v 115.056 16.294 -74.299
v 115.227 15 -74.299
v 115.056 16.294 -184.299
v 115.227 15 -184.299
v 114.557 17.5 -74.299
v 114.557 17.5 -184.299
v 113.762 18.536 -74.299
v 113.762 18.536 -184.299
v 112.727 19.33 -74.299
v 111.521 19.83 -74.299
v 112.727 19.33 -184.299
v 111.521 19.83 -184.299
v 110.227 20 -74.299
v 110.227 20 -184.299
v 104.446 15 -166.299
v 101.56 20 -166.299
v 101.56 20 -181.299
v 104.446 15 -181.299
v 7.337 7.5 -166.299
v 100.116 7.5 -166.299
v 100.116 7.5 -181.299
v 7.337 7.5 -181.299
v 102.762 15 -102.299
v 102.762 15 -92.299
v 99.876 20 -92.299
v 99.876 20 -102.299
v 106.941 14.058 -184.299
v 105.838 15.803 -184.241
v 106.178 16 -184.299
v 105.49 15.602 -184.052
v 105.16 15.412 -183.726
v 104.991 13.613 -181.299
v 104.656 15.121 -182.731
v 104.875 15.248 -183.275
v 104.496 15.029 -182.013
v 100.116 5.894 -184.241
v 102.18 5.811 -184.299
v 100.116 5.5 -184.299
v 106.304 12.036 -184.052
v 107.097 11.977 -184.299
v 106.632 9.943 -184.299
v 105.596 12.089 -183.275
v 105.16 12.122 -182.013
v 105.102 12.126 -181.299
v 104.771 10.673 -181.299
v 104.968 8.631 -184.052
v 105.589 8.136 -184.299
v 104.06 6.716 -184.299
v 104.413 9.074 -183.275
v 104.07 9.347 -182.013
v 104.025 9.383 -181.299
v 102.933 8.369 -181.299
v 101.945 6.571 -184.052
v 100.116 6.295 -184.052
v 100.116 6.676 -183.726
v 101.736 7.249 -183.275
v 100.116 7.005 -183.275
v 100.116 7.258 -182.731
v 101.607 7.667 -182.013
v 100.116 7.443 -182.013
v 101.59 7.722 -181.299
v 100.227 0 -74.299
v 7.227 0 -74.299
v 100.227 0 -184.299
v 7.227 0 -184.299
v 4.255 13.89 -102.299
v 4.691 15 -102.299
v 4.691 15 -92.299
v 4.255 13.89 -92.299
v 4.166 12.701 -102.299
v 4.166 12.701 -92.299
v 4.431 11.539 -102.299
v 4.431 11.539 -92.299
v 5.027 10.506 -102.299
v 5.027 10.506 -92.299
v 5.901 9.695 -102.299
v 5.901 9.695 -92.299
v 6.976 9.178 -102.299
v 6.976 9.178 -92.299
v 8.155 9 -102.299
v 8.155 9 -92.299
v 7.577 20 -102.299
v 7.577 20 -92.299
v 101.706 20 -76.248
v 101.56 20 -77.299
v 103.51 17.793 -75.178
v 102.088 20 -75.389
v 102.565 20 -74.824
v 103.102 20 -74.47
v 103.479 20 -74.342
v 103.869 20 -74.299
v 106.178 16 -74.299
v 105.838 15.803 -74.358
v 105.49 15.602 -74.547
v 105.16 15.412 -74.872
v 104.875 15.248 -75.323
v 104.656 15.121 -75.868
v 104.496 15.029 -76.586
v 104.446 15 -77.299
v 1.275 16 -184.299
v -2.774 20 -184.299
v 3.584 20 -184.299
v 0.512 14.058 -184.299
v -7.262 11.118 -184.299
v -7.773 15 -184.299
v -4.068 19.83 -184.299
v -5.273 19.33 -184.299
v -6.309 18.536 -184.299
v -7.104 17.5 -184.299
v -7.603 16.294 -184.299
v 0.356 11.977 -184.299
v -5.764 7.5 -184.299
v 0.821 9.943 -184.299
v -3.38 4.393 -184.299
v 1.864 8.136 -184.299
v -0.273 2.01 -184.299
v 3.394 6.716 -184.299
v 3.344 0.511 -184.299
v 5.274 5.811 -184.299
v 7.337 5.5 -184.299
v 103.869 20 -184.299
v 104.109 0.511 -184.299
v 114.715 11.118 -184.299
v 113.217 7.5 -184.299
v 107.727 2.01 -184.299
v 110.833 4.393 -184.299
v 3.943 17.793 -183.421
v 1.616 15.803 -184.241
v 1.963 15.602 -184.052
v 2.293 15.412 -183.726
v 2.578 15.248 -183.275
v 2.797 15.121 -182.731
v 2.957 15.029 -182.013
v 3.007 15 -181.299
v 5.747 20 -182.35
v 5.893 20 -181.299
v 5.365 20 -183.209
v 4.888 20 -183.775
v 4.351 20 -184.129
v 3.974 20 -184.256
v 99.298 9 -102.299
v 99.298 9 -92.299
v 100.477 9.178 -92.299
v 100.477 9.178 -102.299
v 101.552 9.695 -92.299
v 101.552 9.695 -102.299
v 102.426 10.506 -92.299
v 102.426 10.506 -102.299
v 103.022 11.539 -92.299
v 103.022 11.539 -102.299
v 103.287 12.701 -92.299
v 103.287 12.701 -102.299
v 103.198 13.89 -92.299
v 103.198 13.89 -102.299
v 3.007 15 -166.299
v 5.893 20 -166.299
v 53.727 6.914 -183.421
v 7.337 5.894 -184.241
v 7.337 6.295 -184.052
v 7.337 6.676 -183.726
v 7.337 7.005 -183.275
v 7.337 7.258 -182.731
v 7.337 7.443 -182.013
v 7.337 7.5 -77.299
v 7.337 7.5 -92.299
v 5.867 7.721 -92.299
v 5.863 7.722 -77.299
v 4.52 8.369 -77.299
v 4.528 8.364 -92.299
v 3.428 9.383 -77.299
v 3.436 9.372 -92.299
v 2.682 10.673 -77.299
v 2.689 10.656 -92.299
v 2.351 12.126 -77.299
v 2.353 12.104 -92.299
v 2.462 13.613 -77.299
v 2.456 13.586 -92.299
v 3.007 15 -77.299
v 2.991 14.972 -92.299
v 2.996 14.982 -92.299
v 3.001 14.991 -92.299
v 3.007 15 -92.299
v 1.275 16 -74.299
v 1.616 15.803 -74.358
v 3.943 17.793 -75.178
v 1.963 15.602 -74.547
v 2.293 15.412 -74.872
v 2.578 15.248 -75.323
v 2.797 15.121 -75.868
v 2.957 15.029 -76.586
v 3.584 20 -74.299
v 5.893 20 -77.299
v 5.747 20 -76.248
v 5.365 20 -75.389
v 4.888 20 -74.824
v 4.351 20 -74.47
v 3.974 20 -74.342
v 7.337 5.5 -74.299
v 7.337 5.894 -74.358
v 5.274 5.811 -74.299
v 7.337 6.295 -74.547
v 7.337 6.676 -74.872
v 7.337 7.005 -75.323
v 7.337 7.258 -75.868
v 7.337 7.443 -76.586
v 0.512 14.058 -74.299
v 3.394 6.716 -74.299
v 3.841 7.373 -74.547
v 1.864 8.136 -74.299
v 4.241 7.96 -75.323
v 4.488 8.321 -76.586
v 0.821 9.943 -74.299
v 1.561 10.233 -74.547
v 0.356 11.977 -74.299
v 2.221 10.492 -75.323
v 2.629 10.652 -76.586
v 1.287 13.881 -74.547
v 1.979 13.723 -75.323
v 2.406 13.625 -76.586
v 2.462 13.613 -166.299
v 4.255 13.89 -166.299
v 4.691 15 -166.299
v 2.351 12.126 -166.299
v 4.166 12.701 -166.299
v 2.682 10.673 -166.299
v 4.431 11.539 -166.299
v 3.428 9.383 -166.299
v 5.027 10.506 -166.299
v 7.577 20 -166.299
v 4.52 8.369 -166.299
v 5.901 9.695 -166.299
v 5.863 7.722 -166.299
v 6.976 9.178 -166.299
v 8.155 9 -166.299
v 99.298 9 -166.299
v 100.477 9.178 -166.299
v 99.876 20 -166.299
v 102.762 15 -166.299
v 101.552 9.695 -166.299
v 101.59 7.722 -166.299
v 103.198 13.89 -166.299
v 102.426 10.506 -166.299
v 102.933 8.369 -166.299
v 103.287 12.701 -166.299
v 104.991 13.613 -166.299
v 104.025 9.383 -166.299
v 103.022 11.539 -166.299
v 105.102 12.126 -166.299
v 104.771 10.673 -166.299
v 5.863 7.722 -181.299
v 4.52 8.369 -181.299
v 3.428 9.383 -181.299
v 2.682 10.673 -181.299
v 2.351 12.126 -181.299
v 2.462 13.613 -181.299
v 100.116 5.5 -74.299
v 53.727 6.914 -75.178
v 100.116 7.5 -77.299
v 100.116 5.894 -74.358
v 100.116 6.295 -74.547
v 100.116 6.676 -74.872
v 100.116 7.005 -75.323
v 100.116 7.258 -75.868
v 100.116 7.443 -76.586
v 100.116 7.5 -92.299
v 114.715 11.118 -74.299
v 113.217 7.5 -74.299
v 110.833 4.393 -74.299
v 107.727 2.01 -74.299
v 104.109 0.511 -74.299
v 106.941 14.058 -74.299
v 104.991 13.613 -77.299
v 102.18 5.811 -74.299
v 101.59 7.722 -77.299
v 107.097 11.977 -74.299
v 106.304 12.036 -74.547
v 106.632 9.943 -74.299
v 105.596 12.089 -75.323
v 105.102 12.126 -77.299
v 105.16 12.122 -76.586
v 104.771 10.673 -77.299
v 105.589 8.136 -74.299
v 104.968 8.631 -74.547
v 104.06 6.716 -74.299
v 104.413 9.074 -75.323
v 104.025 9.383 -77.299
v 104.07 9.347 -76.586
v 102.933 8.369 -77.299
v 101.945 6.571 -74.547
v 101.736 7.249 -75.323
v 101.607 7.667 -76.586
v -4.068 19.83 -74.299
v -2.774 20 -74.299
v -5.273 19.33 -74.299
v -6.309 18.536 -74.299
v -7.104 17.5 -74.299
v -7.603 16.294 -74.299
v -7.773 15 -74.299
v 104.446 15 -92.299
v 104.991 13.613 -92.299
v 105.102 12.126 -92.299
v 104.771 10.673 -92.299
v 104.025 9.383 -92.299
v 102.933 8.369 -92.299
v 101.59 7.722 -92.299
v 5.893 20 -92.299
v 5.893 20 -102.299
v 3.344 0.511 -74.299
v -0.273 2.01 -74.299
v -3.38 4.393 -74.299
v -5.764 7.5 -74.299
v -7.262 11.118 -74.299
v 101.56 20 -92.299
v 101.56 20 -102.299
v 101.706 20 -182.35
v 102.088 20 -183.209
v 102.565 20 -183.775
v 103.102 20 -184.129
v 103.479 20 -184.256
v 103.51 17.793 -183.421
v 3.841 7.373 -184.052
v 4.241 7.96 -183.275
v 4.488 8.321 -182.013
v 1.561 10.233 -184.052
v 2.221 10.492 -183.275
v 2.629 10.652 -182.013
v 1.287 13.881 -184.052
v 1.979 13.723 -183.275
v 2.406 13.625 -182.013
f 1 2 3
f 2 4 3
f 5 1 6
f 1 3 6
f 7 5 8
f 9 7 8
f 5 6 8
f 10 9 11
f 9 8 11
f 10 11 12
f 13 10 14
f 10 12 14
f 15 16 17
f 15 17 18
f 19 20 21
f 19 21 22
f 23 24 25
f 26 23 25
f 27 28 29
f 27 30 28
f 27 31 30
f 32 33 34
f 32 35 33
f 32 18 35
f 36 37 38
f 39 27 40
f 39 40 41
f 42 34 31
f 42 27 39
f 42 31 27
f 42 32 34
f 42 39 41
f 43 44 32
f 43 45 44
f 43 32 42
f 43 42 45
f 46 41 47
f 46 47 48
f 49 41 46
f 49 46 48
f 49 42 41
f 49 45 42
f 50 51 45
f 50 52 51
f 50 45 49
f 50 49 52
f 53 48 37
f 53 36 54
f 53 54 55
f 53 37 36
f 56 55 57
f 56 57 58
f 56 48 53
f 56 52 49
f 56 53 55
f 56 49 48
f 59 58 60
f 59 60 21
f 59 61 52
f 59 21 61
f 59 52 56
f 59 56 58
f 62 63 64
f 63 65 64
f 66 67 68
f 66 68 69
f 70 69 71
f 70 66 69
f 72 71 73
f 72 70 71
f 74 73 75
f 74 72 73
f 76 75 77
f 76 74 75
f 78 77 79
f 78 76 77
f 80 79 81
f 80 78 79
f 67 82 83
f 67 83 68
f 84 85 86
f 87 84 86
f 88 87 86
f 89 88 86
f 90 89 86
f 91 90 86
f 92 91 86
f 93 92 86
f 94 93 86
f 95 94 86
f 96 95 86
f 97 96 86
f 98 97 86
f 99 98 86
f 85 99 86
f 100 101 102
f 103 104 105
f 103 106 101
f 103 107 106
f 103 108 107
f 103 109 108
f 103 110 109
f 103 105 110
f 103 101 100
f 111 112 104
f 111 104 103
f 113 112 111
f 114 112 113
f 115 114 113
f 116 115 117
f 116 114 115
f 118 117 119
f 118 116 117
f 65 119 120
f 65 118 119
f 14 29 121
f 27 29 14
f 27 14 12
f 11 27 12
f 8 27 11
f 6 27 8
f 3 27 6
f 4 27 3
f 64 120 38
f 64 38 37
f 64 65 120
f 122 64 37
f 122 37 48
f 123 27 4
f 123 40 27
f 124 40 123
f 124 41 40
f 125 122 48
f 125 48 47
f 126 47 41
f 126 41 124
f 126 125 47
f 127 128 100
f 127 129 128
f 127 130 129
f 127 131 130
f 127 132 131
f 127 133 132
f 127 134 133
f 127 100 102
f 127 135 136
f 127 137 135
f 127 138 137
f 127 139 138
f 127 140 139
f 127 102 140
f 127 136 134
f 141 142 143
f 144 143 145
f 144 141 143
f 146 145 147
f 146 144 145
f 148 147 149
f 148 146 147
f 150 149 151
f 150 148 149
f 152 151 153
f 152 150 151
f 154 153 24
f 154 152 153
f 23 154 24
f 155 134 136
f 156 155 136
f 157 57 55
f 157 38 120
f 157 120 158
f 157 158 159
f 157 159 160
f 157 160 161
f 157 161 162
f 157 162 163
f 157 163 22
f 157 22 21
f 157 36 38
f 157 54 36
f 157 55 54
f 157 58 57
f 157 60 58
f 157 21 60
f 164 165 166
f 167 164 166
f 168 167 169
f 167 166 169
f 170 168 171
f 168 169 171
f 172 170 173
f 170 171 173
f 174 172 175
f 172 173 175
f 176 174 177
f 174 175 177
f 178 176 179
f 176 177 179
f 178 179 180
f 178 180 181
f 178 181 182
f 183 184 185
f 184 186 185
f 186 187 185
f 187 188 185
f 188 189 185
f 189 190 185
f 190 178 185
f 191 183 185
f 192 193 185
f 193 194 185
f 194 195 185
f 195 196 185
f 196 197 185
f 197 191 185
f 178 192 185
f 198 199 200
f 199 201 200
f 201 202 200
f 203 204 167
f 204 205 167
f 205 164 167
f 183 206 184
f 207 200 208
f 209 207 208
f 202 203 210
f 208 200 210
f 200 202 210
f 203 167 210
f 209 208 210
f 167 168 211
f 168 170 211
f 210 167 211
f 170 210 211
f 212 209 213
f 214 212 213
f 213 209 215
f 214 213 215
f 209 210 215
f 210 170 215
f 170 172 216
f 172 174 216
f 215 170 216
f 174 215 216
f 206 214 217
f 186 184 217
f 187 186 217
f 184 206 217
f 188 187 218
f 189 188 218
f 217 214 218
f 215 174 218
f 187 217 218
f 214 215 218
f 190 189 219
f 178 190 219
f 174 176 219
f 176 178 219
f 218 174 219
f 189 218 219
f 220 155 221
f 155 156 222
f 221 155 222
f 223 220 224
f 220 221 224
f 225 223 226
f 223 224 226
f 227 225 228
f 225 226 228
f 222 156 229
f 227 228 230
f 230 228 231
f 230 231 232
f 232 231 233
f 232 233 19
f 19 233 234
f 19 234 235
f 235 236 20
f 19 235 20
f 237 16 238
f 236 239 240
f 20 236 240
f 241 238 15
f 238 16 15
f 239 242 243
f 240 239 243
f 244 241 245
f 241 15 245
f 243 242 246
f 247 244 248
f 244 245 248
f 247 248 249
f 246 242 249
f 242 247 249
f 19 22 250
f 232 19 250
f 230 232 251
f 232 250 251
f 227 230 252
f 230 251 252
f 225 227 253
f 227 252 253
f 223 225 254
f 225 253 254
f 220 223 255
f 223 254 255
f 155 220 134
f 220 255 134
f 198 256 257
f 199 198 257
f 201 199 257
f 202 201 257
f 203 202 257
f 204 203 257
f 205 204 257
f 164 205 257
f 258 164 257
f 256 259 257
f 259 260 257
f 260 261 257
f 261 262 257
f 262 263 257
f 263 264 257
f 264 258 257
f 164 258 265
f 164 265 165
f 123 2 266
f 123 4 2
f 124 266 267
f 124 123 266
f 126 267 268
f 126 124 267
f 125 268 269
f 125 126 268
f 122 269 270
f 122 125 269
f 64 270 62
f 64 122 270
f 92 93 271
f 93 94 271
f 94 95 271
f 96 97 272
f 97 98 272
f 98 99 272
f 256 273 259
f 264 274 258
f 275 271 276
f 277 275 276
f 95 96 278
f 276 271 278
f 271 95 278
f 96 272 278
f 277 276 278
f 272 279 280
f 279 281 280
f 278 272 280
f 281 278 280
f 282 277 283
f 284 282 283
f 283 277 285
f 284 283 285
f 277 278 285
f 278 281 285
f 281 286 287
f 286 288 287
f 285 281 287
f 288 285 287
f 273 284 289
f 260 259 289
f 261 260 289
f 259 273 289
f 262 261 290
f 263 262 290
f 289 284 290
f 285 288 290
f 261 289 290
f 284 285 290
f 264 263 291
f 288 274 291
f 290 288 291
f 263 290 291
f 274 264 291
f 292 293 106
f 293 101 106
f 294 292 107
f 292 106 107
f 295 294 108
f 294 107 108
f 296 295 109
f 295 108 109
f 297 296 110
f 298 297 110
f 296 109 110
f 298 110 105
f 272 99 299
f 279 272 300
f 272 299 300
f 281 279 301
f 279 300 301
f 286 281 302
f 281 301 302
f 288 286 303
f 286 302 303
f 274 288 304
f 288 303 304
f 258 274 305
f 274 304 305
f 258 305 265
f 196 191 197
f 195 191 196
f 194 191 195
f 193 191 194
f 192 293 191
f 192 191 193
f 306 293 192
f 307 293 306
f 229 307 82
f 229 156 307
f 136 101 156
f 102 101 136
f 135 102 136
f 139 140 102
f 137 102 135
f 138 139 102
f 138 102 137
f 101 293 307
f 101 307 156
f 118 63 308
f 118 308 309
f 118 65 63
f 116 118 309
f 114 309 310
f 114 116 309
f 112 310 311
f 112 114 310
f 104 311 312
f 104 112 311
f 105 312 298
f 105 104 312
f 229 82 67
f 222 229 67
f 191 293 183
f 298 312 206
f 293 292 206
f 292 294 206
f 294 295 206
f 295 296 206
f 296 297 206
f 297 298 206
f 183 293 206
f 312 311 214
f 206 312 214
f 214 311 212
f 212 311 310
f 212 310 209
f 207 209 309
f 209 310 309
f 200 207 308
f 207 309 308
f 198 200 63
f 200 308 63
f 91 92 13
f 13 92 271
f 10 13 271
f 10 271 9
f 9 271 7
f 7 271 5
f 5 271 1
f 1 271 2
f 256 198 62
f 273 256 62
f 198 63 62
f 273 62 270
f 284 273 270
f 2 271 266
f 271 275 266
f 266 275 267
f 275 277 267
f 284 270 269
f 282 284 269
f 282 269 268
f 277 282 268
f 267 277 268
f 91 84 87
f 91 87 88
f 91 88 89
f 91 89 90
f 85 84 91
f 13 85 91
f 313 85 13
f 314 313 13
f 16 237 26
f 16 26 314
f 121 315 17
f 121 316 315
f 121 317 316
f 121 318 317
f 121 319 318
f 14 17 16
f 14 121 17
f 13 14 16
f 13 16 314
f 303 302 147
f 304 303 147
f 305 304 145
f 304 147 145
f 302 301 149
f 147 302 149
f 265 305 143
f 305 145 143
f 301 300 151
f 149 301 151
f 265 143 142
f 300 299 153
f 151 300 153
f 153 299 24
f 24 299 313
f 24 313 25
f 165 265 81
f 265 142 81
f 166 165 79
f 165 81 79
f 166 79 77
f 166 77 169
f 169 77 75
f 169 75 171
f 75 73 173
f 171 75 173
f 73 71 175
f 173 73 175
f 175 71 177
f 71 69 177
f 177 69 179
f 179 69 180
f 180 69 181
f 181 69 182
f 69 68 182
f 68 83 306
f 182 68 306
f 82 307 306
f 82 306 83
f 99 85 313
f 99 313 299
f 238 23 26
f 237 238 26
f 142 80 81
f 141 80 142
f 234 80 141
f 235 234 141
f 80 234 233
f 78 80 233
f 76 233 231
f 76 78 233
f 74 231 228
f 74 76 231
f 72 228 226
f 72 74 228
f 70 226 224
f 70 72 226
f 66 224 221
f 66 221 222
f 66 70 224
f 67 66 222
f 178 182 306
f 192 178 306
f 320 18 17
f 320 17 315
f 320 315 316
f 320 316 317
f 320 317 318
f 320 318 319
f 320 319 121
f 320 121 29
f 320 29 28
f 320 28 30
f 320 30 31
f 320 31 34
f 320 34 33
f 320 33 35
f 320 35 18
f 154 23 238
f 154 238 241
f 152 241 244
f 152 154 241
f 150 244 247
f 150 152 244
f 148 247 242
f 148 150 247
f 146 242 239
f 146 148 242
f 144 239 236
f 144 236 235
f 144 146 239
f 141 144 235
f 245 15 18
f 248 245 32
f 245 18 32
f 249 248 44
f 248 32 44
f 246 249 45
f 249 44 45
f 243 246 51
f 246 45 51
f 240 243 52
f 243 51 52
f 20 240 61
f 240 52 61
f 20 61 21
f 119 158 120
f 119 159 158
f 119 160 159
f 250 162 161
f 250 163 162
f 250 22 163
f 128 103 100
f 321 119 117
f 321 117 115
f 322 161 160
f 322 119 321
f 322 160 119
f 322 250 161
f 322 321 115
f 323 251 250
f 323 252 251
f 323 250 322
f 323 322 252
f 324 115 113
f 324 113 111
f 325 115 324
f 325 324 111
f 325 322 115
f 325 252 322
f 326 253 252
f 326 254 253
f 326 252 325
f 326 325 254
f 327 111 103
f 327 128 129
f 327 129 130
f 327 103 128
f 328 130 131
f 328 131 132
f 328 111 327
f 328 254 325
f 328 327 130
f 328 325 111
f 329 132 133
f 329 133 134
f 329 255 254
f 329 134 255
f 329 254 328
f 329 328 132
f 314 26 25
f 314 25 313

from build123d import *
from build123d.topology import SkipClean

# Parameters (mm, degrees)
SKETCH1_W           = 123
SKETCH1_H           = 110
BOSS_EXTRUDE1_DEPTH = 20
CUT_EXTRUDE3_DEPTH  = 150
FILLET2_R           = 5
FILLET5_R           = 15
FILLET6_SIZE        = 2
FILLET6_SIZE_2      = 3
FILLET7_SIZE        = 2
FILLET7_SIZE_2      = 3
FILLET8_R           = 5
BOSS_EXTRUDE3_START = -18
SKETCH6_W           = 113
SKETCH6_H           = 14.5
BOSS_EXTRUDE3_DEPTH = 64
CUT_EXTRUDE4_DEPTH  = 64
FILLET10_R          = 4
BOSS_EXTRUDE4_DEPTH = 10


# Some blends are built 0.0001 mm under size
with BuildPart() as part:
    # Sketch1 → Boss-Extrude1 (new body)
    with BuildSketch(Plane(origin=(0, 0, 0), x_dir=(1, 0, 0), z_dir=(0, 1, 0))):
        with Locations((53.726554268, 129.299262381)):
            Rectangle(SKETCH1_W, SKETCH1_H)
    extrude(amount=BOSS_EXTRUDE1_DEPTH)

    # Sketch5 → Cut-Extrude3 (cut)
    with BuildSketch(Plane.XY.offset(-74.299262381)):
        Polygon((5.893432633, 20), (101.559675903, 20), (108.776554268, 7.5), (-1.323445732, 7.5), align=None)
    extrude(amount=-CUT_EXTRUDE3_DEPTH, mode=Mode.SUBTRACT)

    # Fillet2
    fillet2_edges = [part.edges().sort_by_distance(p)[0] for p in [
        (108.776554268, 7.5, -129.299262381),
        (-1.323445732, 7.5, -129.299262381),
    ]]
    fillet(fillet2_edges, radius=FILLET2_R)

    # Fillet5
    fillet5_edges = [part.edges().sort_by_distance(p)[0] for p in [
        (115.226554268, 0, -129.299262381),
        (-7.773445732, 0, -129.299262381),
    ]]
    fillet(fillet5_edges, radius=FILLET5_R)

    # Fillet6
    # an asymmetric fillet: 3, 2 mm, written as the material it takes off along each edge
    with BuildSketch(Plane(origin=(3.006681287, 15, -74.299262381), x_dir=(-0.8660254037844386, 0.5000000000000001, 0), z_dir=(0.5000000000000001, 0.8660254037844387, 0)), Plane(origin=(97.809675903, 26.495190529, -74.299262381), x_dir=(0.8660254037844344, 0.5000000000000074, 0), z_dir=(0.5000000000000074, -0.8660254037844345, 0))) as fillet6_piece_1:
        with BuildLine():
            Bezier((FILLET6_SIZE, 0), (0, 0), (0, -FILLET6_SIZE_2), weights=[1, 0.707106781, 1])
            Line((0, -FILLET6_SIZE_2), (0, 0))
            Line((0, 0), (FILLET6_SIZE, 0))
        make_face()
    extrude(amount=13.273502692, mode=Mode.SUBTRACT)
    with BuildSketch(Plane(origin=(7.336808305, 12.5, -74.299262381), x_dir=(0, -1, 0), z_dir=(1, 0, 0))) as fillet6_piece_2:
        with BuildLine():
            Bezier((5 + FILLET6_SIZE, 0), (5, 0), (5, FILLET6_SIZE_2), weights=[1, 0.707106781, 1])
            Line((5, FILLET6_SIZE_2), (5, 0))
            Line((5, 0), (5 + FILLET6_SIZE, 0))
        make_face()
    revolve(axis=Axis((7.336808305, 12.5, -74.299262381), (0, 0, -1)), revolution_arc=120, mode=Mode.SUBTRACT)
    with BuildSketch(Plane(origin=(100.11630023, 12.5, -74.299262381), x_dir=(0.8660254037844343, 0.5000000000000077, 0), z_dir=(-0.5000000000000077, 0.8660254037844343, 0))) as fillet6_piece_3:
        with BuildLine():
            Bezier((5 + FILLET6_SIZE, 0), (5, 0), (5, FILLET6_SIZE_2), weights=[1, 0.707106781, 1])
            Line((5, FILLET6_SIZE_2), (5, 0))
            Line((5, 0), (5 + FILLET6_SIZE, 0))
        make_face()
    revolve(axis=Axis((100.11630023, 12.5, -74.299262381), (0, 0, -1)), revolution_arc=120, mode=Mode.SUBTRACT)
    with BuildSketch(Plane(origin=(100.11630023, 7.5, -74.299262381), x_dir=(0, -1, 0), z_dir=(-1, 0, 0))) as fillet6_piece_4:
        with BuildLine():
            Bezier((FILLET6_SIZE, 0), (0, 0), (0, -FILLET6_SIZE_2), weights=[1, 0.707106781, 1])
            Line((0, -FILLET6_SIZE_2), (0, 0))
            Line((0, 0), (FILLET6_SIZE, 0))
        make_face()
    extrude(amount=92.779491924, mode=Mode.SUBTRACT)

    # Fillet7
    # an asymmetric fillet: 3, 2 mm, written as the material it takes off along each edge
    with BuildSketch(Plane(origin=(3.006681287, 15, -184.299262381), x_dir=(-0.8660254037844386, 0.5000000000000001, 0), z_dir=(0.5000000000000001, 0.8660254037844387, 0)), Plane(origin=(97.809675903, 26.495190528, -184.299262381), x_dir=(0.8660254037844344, 0.5000000000000074, 0), z_dir=(0.5000000000000074, -0.8660254037844345, 0))) as fillet7_piece_1:
        with BuildLine():
            Bezier((FILLET7_SIZE, 0), (0, 0), (0, FILLET7_SIZE_2), weights=[1, 0.707106781, 1])
            Line((0, FILLET7_SIZE_2), (0, 0))
            Line((0, 0), (FILLET7_SIZE, 0))
        make_face()
    extrude(amount=13.273502692, mode=Mode.SUBTRACT)
    with BuildSketch(Plane(origin=(7.336808305, 12.5, -184.299262381), x_dir=(0, -1, 0), z_dir=(1, 0, 0))) as fillet7_piece_2:
        with BuildLine():
            Bezier((5 + FILLET7_SIZE, 0), (5, 0), (5, -FILLET7_SIZE_2), weights=[1, 0.707106781, 1])
            Line((5, -FILLET7_SIZE_2), (5, 0))
            Line((5, 0), (5 + FILLET7_SIZE, 0))
        make_face()
    revolve(axis=Axis((7.336808305, 12.5, -184.299262381), (0, 0, -1)), revolution_arc=120, mode=Mode.SUBTRACT)
    with BuildSketch(Plane(origin=(100.11630023, 12.5, -184.299262381), x_dir=(0.8660254037844343, 0.5000000000000077, 0), z_dir=(-0.5000000000000077, 0.8660254037844343, 0))) as fillet7_piece_3:
        with BuildLine():
            Bezier((5 + FILLET7_SIZE, 0), (5, 0), (5, -FILLET7_SIZE_2), weights=[1, 0.707106781, 1])
            Line((5, -FILLET7_SIZE_2), (5, 0))
            Line((5, 0), (5 + FILLET7_SIZE, 0))
        make_face()
    revolve(axis=Axis((100.11630023, 12.5, -184.299262381), (0, 0, -1)), revolution_arc=120, mode=Mode.SUBTRACT)
    with BuildSketch(Plane(origin=(100.11630023, 7.5, -184.299262381), x_dir=(0, -1, 0), z_dir=(-1, 0, 0))) as fillet7_piece_4:
        with BuildLine():
            Bezier((FILLET7_SIZE, 0), (0, 0), (0, FILLET7_SIZE_2), weights=[1, 0.707106781, 1])
            Line((0, FILLET7_SIZE_2), (0, 0))
            Line((0, 0), (FILLET7_SIZE, 0))
        make_face()
    extrude(amount=92.779491924, mode=Mode.SUBTRACT)

    # Fillet8
    fillet8_edges = [part.edges().sort_by_distance(p)[0] for p in [
        (-7.773445732, 20, -129.299262381),
        (115.226554268, 20, -129.299262381),
    ]]
    fillet(fillet8_edges, radius=FILLET8_R - 0.0001)  # a hair under: the kernel refuses the full size

    # Sketch6 → Boss-Extrude3 (add)
    with BuildSketch(Plane(origin=(0, 0, -184.299262381), x_dir=(-1, 0, 0), z_dir=(0, 0, -1)).offset(BOSS_EXTRUDE3_START)):
        with Locations((-53.726554268, 12.75)):
            Rectangle(SKETCH6_W, SKETCH6_H)
    extrude(amount=-BOSS_EXTRUDE3_DEPTH)

    # Sketch8 → Cut-Extrude4 (cut)
    with BuildSketch(Plane.XY.offset(-102.299262381)):
        Polygon((1.226554268, 9), (106.226554268, 9), (99.875701307, 20), (7.577407229, 20), align=None)
    extrude(amount=-CUT_EXTRUDE4_DEPTH, mode=Mode.SUBTRACT)

    # Fillet10
    # the kernel refuses this fillet: 4 mm, written as the material it adds along each edge
    with BuildSketch(Plane(origin=(1.226554268, 9, -102.299262381), x_dir=(0.5000000000000043, 0.8660254037844362, 0), z_dir=(0, 0, -1))) as fillet10_piece_1:
        with BuildLine():
            CenterArc((FILLET10_R * 1.73205080757, FILLET10_R), FILLET10_R, 150, 120)
            Line((FILLET10_R * 0.866025403784, FILLET10_R * 1.5), (0, 0))
            Line((0, 0), (FILLET10_R * 1.73205080757, 0))
        make_face()
    extrude(amount=64)
    with BuildSketch(Plane(origin=(106.226554268, 9, -102.299262381), x_dir=(-0.5000000000000053, 0.8660254037844355, 0), z_dir=(0, 0, -1))) as fillet10_piece_2:
        with BuildLine():
            CenterArc((FILLET10_R * 1.73205080757, -FILLET10_R), FILLET10_R, 90, 120)
            Line((FILLET10_R * 0.866025403784, -FILLET10_R * 1.5), (0, 0))
            Line((0, 0), (FILLET10_R * 1.73205080757, 0))
        make_face()
    extrude(amount=64)

    # Sketch9 → Boss-Extrude4 (add)
    with SkipClean():  # the faces are left unmerged after this step: merging them gives an invalid solid
        with BuildSketch(Plane.XY.offset(-102.299262381)):
            with BuildLine():
                Line((8.154757498, 9), (99.298351037, 9))
                ThreePointArc((99.298351037, 9), (102.762452653, 11), (102.762452653, 15))
                Line((102.762452653, 15), (99.875701307, 20))
                Line((99.875701307, 20), (101.559675903, 20))
                Line((101.559675903, 20), (104.446427249, 15))
                ThreePointArc((104.446427249, 15), (104.446427249, 10), (100.11630023, 7.5))
                Line((100.11630023, 7.5), (7.336808305, 7.5))
                ThreePointArc((7.336808305, 7.5), (3.014687704, 9.986183479), (2.990801035, 14.972290599))
                ThreePointArc((2.990801035, 14.972290599), (2.998719037, 14.986157979), (3.006681287, 15))
                Line((3.006681287, 15), (5.893432633, 20))
                Line((5.893432633, 20), (7.577407229, 20))
                Line((7.577407229, 20), (4.690655883, 15))
                ThreePointArc((4.690655883, 15), (4.690655883, 11), (8.154757498, 9))
            make_face()
        extrude(amount=BOSS_EXTRUDE4_DEPTH)


solid = part.part
